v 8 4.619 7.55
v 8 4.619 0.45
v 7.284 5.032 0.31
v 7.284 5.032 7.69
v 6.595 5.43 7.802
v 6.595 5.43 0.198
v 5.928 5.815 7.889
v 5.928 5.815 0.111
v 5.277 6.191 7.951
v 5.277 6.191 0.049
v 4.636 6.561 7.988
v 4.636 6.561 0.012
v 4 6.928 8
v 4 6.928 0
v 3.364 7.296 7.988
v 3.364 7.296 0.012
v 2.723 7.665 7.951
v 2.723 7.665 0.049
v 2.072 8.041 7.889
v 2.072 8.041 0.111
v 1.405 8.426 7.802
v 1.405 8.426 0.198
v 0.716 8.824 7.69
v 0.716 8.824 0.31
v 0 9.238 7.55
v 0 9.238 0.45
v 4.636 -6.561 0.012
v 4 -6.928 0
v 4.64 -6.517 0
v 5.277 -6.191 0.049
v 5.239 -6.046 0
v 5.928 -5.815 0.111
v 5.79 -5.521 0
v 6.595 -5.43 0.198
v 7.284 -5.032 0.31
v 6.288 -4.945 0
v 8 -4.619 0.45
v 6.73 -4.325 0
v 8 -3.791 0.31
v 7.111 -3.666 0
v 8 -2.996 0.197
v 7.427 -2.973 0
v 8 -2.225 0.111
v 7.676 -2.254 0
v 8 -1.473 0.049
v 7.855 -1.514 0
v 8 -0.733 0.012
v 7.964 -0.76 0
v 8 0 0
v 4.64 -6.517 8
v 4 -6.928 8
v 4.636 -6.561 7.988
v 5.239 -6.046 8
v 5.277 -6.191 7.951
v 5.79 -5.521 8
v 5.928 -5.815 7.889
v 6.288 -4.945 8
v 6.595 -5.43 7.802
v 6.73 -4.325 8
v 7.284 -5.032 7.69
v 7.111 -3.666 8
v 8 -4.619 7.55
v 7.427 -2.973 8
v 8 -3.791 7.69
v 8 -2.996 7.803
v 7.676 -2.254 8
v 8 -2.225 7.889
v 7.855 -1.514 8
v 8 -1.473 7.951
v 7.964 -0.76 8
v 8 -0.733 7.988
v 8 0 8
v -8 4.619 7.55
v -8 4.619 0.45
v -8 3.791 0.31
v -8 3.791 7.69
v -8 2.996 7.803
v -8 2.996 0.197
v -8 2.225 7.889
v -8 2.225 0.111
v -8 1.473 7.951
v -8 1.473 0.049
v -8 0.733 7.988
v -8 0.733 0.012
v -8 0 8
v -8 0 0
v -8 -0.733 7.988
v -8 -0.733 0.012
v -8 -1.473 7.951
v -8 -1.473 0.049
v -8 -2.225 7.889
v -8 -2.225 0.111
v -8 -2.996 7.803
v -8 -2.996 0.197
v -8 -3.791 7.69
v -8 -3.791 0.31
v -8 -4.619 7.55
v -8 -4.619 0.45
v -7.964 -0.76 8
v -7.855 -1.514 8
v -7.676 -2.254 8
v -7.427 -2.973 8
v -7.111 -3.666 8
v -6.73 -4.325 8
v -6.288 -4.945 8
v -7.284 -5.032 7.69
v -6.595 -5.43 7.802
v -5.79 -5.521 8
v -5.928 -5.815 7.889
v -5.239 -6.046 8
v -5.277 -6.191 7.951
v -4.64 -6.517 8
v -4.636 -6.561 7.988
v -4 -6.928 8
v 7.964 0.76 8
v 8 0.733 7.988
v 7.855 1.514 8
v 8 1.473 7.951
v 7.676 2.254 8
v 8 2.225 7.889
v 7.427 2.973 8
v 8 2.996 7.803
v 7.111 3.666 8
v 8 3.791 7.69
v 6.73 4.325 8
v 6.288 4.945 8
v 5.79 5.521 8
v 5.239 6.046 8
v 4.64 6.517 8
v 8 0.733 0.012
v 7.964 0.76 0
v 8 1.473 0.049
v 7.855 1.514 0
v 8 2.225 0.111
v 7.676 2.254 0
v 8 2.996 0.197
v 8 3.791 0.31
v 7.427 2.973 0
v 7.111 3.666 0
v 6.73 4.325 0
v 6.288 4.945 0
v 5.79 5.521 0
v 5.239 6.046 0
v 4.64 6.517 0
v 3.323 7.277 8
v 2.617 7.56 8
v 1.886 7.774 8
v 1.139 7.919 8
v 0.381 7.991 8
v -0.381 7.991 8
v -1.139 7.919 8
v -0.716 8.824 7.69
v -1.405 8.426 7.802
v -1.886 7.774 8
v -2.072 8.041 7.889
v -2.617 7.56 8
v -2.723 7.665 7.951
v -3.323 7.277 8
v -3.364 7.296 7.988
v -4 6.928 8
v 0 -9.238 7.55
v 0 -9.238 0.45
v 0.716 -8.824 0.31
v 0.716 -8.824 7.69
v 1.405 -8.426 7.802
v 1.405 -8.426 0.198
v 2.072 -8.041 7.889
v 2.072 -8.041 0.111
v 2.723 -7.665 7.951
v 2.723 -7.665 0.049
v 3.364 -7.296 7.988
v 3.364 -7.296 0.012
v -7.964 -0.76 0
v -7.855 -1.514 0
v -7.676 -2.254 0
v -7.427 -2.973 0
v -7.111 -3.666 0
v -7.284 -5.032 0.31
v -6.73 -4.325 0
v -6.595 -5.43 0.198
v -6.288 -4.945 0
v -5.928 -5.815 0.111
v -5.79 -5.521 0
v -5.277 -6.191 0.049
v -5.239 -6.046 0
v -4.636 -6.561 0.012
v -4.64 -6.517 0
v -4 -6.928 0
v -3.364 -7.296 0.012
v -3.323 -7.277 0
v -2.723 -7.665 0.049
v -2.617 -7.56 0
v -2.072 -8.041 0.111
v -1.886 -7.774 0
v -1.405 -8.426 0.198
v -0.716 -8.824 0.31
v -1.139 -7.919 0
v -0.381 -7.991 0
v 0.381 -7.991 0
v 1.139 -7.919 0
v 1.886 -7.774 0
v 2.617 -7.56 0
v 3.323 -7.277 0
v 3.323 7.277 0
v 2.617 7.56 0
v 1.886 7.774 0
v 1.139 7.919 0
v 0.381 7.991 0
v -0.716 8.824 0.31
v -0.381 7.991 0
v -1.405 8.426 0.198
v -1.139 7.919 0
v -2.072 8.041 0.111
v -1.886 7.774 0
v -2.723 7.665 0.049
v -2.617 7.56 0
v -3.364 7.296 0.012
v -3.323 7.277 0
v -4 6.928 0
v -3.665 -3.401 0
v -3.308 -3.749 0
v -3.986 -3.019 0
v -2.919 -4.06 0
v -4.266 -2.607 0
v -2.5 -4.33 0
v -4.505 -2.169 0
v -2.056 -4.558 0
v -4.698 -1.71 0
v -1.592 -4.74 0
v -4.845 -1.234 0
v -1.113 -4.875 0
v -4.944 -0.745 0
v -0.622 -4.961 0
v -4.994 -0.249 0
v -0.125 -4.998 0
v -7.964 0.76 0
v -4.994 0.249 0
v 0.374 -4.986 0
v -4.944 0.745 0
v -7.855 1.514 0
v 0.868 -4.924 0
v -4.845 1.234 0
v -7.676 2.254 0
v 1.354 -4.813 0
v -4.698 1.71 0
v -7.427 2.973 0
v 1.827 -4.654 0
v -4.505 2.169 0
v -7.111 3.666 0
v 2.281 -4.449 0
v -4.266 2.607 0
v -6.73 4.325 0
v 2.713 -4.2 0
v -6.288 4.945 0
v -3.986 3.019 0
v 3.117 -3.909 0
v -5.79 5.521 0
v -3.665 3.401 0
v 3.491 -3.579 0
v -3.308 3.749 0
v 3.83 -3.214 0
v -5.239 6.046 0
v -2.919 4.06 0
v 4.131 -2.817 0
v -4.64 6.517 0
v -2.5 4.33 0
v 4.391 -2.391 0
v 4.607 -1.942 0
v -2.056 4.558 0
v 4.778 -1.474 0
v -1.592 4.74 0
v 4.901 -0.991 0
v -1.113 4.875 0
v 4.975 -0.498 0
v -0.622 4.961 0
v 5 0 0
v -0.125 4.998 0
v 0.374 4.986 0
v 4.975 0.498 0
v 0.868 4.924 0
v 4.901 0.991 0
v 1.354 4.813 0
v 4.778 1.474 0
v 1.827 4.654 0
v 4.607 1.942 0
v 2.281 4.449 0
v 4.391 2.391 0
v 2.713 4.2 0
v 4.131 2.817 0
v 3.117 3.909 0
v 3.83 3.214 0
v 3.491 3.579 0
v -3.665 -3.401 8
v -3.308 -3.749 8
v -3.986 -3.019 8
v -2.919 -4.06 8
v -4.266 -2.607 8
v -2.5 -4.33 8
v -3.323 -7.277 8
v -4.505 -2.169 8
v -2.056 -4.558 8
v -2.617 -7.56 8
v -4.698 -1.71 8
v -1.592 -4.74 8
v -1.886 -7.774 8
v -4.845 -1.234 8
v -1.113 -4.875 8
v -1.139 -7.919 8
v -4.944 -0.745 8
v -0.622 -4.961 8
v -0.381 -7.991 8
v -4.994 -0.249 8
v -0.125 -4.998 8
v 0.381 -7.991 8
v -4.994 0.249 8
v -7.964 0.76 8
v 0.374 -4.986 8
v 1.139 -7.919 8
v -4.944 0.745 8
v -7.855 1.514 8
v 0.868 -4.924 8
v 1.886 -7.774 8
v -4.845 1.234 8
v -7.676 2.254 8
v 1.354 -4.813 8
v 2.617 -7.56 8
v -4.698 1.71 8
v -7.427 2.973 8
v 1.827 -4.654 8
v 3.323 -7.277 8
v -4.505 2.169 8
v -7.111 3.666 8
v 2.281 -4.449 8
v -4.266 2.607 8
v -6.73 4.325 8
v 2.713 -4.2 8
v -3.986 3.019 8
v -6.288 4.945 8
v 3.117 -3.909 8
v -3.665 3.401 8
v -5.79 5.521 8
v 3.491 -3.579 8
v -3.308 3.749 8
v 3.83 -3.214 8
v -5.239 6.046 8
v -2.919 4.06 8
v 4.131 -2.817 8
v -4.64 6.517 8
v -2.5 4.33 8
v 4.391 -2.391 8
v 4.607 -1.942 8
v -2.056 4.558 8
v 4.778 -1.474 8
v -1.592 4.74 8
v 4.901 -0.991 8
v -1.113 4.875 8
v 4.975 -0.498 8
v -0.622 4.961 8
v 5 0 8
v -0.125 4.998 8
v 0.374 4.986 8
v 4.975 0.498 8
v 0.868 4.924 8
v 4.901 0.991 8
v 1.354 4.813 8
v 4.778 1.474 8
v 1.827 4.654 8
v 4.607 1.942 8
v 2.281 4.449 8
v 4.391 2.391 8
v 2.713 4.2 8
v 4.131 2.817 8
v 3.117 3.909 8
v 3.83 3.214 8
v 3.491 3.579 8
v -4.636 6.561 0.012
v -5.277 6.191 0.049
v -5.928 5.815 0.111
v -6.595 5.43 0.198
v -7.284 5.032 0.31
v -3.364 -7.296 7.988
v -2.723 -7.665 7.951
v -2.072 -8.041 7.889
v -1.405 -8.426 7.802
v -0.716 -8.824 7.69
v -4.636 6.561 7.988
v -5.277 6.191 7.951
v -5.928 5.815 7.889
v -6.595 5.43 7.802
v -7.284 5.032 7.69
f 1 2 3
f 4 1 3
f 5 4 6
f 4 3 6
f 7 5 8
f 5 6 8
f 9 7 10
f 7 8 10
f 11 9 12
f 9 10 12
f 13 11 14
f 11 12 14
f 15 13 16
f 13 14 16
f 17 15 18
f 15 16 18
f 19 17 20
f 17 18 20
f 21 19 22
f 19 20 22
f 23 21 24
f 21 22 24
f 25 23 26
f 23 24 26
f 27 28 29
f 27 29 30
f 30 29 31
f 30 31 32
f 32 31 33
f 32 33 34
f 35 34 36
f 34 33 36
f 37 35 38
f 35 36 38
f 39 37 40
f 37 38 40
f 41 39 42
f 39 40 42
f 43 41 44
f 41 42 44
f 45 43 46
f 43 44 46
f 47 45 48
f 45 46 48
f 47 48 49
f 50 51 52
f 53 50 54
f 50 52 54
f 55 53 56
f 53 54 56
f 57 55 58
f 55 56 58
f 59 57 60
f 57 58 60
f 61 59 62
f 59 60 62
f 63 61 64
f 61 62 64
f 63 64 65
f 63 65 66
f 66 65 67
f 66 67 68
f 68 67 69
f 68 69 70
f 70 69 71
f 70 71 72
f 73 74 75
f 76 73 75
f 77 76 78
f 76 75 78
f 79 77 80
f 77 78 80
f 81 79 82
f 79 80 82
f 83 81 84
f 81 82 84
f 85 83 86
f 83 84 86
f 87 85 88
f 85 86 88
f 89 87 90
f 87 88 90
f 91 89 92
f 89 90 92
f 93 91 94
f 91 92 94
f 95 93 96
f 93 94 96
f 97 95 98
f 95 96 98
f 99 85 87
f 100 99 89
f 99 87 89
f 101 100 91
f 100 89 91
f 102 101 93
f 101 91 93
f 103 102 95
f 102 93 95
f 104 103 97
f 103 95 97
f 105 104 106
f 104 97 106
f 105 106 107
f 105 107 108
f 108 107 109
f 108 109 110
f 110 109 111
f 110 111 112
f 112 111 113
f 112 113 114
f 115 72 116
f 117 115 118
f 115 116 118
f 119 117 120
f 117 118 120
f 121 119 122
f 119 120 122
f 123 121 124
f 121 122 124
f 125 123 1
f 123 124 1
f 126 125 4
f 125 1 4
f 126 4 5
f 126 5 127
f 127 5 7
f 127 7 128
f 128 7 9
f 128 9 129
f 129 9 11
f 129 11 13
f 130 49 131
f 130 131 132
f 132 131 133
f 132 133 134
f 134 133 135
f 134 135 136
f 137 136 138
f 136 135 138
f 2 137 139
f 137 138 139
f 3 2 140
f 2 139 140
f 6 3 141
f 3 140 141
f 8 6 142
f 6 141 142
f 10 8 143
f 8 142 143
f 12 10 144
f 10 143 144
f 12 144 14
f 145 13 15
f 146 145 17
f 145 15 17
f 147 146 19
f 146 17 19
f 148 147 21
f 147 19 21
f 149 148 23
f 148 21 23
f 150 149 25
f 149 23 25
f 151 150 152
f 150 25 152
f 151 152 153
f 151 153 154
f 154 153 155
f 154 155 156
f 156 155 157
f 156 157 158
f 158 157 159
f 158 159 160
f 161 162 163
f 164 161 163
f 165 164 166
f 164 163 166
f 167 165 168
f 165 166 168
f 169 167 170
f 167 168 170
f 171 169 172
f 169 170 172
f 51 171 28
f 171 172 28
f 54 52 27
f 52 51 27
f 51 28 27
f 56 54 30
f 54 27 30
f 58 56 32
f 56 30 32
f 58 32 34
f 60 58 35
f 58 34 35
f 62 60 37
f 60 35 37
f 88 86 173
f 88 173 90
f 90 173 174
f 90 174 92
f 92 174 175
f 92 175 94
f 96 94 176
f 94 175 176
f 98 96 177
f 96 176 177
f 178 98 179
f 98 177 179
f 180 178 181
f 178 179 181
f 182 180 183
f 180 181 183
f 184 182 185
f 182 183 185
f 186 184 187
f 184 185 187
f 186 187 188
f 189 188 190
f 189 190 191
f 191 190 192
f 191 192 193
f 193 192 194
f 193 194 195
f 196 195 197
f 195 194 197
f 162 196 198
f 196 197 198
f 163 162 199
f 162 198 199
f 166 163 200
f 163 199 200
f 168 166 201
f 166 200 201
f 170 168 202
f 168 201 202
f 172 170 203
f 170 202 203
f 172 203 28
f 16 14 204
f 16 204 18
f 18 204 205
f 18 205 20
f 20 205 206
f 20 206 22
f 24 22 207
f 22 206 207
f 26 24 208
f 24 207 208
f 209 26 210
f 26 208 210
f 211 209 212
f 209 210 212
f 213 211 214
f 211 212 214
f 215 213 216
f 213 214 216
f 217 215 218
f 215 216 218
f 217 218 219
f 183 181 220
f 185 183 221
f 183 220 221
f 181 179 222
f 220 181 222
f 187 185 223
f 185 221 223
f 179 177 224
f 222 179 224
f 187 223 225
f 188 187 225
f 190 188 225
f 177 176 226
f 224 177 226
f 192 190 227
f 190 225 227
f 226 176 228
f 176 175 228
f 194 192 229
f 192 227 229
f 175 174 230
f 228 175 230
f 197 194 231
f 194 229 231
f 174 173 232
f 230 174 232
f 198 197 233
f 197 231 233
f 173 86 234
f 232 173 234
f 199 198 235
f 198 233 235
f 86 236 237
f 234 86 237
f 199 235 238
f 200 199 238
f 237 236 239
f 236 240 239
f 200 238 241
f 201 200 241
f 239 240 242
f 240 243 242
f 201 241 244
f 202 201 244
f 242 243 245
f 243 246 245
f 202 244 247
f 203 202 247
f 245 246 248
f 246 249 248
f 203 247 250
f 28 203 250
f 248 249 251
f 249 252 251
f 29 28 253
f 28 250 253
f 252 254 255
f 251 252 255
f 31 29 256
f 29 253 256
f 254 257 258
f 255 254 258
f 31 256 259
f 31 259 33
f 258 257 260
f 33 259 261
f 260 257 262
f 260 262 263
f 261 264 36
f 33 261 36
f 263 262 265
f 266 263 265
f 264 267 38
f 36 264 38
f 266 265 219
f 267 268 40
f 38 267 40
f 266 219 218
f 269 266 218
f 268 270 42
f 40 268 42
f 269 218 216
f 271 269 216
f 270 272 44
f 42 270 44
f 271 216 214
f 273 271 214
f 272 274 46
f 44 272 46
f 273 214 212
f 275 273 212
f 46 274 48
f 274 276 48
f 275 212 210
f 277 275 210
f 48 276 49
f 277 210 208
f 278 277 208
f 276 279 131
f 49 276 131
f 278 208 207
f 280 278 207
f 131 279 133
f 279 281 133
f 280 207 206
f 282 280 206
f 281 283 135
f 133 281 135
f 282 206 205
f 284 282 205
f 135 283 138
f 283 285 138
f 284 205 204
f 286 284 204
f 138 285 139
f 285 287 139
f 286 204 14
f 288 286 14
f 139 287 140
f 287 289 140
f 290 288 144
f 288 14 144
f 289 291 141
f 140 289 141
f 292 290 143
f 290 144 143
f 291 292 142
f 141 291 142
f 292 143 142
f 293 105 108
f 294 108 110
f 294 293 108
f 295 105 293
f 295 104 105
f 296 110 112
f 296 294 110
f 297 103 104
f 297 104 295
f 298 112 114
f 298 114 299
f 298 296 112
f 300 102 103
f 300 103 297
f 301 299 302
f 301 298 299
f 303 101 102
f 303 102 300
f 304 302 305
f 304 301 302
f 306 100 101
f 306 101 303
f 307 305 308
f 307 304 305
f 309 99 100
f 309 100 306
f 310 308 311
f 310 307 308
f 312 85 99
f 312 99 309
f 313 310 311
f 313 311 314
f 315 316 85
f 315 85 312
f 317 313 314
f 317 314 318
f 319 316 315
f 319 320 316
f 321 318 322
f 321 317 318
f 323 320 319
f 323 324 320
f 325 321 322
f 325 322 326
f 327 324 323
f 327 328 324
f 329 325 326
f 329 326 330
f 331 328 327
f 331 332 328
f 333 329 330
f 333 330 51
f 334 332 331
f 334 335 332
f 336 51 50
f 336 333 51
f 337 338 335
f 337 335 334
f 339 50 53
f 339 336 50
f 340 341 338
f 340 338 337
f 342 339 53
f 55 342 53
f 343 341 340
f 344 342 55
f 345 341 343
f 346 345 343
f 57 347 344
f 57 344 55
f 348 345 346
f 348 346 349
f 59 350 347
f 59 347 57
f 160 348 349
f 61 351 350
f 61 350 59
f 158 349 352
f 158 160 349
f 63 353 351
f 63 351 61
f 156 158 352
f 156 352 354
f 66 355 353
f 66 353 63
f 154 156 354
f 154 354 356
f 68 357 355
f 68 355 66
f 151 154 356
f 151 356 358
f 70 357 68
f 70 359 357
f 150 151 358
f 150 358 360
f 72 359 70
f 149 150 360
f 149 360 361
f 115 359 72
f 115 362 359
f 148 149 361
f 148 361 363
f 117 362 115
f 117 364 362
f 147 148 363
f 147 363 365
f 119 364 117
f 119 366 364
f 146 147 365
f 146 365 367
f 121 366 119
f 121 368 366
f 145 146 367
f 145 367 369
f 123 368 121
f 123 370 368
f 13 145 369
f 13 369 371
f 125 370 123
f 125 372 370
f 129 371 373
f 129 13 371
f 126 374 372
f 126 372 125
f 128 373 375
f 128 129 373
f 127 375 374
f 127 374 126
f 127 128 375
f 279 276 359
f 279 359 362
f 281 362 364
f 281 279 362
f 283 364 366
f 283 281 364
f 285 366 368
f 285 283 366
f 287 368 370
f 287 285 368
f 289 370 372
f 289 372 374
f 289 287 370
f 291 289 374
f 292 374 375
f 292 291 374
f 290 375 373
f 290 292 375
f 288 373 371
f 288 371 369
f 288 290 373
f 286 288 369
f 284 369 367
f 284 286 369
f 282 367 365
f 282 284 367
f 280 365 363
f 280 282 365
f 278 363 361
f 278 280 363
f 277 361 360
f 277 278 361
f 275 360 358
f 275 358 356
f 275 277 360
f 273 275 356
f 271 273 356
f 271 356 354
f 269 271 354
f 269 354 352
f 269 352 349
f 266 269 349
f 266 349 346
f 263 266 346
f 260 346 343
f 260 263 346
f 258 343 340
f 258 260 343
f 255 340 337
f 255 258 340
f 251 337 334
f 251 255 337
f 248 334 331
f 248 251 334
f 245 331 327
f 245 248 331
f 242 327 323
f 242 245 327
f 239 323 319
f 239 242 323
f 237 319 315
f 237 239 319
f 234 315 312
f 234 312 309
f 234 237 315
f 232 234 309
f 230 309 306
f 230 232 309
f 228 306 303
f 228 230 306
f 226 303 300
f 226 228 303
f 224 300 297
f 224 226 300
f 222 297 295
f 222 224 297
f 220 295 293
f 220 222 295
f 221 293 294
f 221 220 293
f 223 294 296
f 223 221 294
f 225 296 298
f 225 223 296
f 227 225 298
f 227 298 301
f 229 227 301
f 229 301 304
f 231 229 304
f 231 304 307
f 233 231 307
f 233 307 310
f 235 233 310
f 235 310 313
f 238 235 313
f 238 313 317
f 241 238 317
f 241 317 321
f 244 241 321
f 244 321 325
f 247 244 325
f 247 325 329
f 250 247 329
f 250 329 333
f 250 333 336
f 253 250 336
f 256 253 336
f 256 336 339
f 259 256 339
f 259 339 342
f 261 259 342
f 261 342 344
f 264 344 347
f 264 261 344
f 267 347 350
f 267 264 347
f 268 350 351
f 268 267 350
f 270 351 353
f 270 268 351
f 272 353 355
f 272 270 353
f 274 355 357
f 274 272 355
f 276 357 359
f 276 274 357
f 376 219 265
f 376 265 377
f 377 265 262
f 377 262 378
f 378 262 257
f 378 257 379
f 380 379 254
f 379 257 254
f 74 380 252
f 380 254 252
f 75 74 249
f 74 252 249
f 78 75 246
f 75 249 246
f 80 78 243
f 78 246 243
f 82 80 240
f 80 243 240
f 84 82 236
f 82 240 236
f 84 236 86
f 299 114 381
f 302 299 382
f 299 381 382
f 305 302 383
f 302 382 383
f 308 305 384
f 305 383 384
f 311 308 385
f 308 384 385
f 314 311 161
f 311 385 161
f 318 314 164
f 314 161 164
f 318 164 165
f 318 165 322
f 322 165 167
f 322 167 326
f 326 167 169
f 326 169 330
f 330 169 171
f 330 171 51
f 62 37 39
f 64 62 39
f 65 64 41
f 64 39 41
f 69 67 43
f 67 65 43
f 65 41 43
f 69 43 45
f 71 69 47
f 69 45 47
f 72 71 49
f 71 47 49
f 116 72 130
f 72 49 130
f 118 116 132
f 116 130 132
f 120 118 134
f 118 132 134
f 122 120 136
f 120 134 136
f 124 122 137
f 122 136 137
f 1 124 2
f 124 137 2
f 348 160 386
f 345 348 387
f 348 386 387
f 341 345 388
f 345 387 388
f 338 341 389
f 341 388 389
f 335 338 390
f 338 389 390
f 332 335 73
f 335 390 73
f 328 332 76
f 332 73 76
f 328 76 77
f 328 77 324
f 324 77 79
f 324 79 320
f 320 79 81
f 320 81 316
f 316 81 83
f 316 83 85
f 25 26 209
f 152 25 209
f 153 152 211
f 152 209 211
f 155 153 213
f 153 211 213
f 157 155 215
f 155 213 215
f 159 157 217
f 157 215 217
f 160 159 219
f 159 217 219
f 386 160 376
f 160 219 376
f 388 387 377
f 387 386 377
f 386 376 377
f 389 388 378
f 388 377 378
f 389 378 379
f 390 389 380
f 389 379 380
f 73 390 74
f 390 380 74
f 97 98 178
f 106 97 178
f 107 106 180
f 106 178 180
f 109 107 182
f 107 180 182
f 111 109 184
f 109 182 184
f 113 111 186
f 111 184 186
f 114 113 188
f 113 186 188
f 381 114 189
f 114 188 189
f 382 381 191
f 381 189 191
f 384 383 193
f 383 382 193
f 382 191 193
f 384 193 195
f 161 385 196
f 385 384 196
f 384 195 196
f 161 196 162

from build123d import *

# Parameters (mm, degrees)
F0_R     = 5
F1_DEPTH = 8


with BuildPart() as f1:
    # F0 (on Top) → F1 (new body)
    with BuildSketch(Plane.XY):
        Polygon((8, -4.618802), (8, 4.618802), (0, 9.237604), (-8, 4.618802), (-8, -4.618802), (0, -9.237604), align=None)
        Circle(F0_R, mode=Mode.SUBTRACT)
    extrude(amount=F1_DEPTH)

    # F2 (on Right) → F3 (revolve, intersect)
    with BuildSketch(Plane.YZ):
        Polygon((-8, 0), (0, 0), (0, 8), (-8, 8), (-9.237604, 7.549549), (-9.237604, 0.450451), align=None)
    revolve(axis=Axis((0, 0, 4.732898), (0, 0, 1)), mode=Mode.INTERSECT)


solid = f1.part
